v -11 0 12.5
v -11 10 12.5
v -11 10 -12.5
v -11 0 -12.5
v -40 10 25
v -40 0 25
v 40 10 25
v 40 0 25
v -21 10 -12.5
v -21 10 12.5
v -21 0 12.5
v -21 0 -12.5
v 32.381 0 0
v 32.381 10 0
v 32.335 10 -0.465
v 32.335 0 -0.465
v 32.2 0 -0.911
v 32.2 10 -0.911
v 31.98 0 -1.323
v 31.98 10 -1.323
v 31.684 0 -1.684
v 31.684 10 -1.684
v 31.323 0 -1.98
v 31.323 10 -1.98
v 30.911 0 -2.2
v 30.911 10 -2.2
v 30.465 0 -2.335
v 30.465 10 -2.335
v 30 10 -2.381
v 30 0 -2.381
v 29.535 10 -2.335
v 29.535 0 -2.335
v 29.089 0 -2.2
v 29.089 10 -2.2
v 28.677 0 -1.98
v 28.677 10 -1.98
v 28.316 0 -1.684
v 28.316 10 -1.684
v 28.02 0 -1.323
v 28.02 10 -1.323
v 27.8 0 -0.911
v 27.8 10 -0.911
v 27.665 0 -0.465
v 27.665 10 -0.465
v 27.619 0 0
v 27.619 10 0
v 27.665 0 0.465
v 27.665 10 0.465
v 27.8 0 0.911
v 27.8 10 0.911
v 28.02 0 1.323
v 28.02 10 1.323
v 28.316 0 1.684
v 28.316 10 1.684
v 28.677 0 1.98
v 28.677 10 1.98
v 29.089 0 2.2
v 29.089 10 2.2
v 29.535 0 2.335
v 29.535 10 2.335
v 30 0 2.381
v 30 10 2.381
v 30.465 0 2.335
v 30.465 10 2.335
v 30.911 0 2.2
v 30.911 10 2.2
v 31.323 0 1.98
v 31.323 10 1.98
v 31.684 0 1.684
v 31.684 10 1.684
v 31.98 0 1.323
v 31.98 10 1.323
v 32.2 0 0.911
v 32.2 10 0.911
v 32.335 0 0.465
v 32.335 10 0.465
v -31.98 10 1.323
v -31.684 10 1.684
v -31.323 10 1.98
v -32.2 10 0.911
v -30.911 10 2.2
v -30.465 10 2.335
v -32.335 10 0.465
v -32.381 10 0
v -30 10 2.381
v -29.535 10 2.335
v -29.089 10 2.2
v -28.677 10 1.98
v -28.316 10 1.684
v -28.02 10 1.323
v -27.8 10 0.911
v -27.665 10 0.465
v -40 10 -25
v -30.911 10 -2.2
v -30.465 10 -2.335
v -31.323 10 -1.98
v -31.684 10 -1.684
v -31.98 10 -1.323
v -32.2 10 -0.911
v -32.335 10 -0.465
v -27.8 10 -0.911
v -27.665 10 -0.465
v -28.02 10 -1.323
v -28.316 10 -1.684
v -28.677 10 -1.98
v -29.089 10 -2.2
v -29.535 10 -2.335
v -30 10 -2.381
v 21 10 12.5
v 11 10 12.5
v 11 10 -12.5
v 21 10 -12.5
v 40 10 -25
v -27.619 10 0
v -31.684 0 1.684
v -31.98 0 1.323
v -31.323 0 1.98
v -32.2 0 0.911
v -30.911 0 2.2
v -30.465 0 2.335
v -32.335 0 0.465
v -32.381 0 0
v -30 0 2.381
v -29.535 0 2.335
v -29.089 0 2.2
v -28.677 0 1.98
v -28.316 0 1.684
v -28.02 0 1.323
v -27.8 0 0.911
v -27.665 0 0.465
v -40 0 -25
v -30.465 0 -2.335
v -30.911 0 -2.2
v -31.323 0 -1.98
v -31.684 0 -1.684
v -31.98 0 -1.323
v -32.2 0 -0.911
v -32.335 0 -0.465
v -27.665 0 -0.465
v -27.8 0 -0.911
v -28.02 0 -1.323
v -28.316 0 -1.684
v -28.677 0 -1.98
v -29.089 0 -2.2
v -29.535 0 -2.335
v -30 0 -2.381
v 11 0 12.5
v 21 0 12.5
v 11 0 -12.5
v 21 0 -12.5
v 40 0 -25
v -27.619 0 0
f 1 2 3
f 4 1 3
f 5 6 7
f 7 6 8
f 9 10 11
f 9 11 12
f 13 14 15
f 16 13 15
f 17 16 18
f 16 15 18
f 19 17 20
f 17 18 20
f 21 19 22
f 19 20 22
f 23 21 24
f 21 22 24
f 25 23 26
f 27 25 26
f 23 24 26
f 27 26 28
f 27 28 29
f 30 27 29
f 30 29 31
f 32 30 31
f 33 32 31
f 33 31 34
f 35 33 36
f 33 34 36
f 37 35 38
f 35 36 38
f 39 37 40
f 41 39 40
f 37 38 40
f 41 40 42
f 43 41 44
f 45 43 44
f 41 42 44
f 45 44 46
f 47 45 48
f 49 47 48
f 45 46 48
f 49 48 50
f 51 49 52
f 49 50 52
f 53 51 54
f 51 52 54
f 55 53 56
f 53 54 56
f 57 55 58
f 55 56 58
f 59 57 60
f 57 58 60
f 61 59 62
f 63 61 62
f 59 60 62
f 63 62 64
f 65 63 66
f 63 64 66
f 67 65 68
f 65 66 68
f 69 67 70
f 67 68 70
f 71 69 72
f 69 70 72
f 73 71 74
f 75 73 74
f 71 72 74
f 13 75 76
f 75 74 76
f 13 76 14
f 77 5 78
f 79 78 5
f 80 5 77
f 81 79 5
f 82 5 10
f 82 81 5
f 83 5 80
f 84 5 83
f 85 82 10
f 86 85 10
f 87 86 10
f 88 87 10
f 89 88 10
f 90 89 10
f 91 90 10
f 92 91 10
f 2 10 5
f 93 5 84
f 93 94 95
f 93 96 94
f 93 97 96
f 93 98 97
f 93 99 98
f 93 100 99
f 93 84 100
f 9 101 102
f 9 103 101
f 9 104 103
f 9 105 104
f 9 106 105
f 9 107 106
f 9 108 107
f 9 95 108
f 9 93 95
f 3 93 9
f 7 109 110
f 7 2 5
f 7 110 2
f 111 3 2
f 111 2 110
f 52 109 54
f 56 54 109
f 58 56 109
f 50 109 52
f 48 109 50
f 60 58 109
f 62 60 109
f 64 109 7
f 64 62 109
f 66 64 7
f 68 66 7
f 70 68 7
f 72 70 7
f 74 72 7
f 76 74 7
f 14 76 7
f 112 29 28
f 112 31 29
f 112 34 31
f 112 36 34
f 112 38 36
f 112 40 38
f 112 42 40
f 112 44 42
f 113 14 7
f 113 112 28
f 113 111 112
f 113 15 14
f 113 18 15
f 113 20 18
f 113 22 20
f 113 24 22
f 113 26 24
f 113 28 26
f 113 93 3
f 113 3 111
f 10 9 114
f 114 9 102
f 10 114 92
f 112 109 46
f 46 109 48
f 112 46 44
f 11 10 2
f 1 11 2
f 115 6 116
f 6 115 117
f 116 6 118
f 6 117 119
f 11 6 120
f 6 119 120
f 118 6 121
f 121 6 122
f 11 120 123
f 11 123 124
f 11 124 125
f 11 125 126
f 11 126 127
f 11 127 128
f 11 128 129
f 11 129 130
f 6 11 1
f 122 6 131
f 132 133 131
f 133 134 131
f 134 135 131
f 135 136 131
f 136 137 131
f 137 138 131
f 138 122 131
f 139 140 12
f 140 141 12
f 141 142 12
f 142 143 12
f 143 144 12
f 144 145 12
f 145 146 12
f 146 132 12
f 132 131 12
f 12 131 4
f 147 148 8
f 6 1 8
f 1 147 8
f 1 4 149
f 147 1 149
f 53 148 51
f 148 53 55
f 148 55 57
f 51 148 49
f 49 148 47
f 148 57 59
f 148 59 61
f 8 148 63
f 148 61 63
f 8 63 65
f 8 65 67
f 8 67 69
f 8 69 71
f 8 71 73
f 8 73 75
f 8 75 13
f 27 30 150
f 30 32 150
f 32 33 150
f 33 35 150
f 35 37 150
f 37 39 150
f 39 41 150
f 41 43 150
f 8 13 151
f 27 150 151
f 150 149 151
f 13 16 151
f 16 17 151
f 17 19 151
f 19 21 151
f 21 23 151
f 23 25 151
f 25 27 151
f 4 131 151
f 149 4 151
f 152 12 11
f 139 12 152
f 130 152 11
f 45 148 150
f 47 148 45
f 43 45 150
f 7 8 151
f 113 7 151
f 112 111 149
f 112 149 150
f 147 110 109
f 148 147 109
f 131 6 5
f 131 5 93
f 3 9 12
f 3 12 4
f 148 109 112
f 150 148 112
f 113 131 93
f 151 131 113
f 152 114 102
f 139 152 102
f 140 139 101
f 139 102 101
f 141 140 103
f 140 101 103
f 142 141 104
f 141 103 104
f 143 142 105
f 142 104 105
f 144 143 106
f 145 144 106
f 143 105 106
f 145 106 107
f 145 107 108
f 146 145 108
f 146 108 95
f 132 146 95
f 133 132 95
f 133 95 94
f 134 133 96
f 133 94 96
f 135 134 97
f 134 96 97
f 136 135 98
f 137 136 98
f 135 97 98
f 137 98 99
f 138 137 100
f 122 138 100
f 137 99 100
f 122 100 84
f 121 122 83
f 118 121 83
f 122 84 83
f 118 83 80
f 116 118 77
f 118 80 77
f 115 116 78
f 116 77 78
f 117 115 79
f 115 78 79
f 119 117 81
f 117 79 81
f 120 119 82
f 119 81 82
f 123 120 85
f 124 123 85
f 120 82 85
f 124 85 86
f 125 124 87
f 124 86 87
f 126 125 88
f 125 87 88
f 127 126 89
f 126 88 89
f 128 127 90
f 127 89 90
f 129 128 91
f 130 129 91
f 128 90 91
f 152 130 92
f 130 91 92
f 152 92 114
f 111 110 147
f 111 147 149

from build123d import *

# Parameters (mm, degrees)
SKETCH1_W           = 80
SKETCH1_H           = 50
BOSS_EXTRUDE1_DEPTH = 10
SKETCH2_R           = 2.38125
CUT_EXTRUDE1_DEPTH  = 10
SKETCH3_W           = 10
SKETCH3_H           = 25
CUT_EXTRUDE2_DEPTH  = 10


with BuildPart() as part:
    # Sketch1 → Boss-Extrude1 (new body)
    with BuildSketch(Plane(origin=(0, 0, 0), x_dir=(1, 0, 0), z_dir=(0, 1, 0))):
        Rectangle(SKETCH1_W, SKETCH1_H)
    extrude(amount=BOSS_EXTRUDE1_DEPTH)

    # Sketch2 → Cut-Extrude1 (cut)
    with BuildSketch(Plane(origin=(0, 10, 0), x_dir=(1, 0, 0), z_dir=(0, 1, 0))):
        with Locations((-30, 0)):
            Circle(SKETCH2_R)
        with Locations((30, 0)):
            Circle(SKETCH2_R)
    extrude(amount=-CUT_EXTRUDE1_DEPTH, mode=Mode.SUBTRACT)

    # Sketch3 → Cut-Extrude2 (cut)
    with BuildSketch(Plane(origin=(0, 10, 0), x_dir=(1, 0, 0), z_dir=(0, 1, 0))):
        with Locations((-16, 0)):
            Rectangle(SKETCH3_W, SKETCH3_H)
        with Locations((16, 0)):
            Rectangle(SKETCH3_W, SKETCH3_H)
    extrude(amount=-CUT_EXTRUDE2_DEPTH, mode=Mode.SUBTRACT)


solid = part.part
